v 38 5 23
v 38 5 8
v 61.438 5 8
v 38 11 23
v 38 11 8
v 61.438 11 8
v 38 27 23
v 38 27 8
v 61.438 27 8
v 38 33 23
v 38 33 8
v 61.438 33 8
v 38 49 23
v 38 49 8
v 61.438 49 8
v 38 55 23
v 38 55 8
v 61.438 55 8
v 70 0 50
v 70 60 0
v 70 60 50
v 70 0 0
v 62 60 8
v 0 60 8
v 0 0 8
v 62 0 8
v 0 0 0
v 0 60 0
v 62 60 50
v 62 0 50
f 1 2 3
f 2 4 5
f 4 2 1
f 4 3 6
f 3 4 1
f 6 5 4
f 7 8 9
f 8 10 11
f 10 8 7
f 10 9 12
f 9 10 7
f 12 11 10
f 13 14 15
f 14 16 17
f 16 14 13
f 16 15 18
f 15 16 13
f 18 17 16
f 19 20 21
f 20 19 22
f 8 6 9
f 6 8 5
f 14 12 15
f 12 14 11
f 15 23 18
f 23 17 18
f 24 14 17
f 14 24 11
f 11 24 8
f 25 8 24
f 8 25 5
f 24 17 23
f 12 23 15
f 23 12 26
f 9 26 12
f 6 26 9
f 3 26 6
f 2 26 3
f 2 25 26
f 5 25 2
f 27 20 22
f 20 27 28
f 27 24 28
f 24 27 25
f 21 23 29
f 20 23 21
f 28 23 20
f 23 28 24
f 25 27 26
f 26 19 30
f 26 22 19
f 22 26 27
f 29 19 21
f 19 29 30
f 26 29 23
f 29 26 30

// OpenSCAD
$fn = 32;

// ----------------------------------------------------------------------
// Rib bracket: 3-gusset L bracket
// ----------------------------------------------------------------------

// --- parameters (mm) ---
base_l = 70;              // foot length, X
base_w = 60;              // foot width, Y
base_t = 8;               // foot thickness
plate_t = 8;              // upright plate thickness
plate_h = 50;             // overall height
gus_l = 24;               // gusset leg along the foot
gus_h = 16;               // gusset height
gus_t = 6;                // gusset thickness
gus_edge = 5;             // gusset margin from the foot edge
n_gus = 3;                // gusset count

gus_pitch = (base_w - 2 * gus_edge - gus_t) / (n_gus - 1);  // gusset pitch

union() {
  cube([base_l, base_w, base_t]);
  translate([base_l - plate_t, 0, base_t - 1])
    cube([plate_t, base_w, plate_h - base_t + 1]);
  for (i = [0 : n_gus - 1])
    translate([base_l - plate_t - gus_l, gus_edge + i * gus_pitch, base_t - 1])
      rotate([-90, 0, 0])
        linear_extrude(height = gus_t)
          polygon(points = [[0, 0], [gus_l + 1, 0], [0, -gus_h]]);
}
